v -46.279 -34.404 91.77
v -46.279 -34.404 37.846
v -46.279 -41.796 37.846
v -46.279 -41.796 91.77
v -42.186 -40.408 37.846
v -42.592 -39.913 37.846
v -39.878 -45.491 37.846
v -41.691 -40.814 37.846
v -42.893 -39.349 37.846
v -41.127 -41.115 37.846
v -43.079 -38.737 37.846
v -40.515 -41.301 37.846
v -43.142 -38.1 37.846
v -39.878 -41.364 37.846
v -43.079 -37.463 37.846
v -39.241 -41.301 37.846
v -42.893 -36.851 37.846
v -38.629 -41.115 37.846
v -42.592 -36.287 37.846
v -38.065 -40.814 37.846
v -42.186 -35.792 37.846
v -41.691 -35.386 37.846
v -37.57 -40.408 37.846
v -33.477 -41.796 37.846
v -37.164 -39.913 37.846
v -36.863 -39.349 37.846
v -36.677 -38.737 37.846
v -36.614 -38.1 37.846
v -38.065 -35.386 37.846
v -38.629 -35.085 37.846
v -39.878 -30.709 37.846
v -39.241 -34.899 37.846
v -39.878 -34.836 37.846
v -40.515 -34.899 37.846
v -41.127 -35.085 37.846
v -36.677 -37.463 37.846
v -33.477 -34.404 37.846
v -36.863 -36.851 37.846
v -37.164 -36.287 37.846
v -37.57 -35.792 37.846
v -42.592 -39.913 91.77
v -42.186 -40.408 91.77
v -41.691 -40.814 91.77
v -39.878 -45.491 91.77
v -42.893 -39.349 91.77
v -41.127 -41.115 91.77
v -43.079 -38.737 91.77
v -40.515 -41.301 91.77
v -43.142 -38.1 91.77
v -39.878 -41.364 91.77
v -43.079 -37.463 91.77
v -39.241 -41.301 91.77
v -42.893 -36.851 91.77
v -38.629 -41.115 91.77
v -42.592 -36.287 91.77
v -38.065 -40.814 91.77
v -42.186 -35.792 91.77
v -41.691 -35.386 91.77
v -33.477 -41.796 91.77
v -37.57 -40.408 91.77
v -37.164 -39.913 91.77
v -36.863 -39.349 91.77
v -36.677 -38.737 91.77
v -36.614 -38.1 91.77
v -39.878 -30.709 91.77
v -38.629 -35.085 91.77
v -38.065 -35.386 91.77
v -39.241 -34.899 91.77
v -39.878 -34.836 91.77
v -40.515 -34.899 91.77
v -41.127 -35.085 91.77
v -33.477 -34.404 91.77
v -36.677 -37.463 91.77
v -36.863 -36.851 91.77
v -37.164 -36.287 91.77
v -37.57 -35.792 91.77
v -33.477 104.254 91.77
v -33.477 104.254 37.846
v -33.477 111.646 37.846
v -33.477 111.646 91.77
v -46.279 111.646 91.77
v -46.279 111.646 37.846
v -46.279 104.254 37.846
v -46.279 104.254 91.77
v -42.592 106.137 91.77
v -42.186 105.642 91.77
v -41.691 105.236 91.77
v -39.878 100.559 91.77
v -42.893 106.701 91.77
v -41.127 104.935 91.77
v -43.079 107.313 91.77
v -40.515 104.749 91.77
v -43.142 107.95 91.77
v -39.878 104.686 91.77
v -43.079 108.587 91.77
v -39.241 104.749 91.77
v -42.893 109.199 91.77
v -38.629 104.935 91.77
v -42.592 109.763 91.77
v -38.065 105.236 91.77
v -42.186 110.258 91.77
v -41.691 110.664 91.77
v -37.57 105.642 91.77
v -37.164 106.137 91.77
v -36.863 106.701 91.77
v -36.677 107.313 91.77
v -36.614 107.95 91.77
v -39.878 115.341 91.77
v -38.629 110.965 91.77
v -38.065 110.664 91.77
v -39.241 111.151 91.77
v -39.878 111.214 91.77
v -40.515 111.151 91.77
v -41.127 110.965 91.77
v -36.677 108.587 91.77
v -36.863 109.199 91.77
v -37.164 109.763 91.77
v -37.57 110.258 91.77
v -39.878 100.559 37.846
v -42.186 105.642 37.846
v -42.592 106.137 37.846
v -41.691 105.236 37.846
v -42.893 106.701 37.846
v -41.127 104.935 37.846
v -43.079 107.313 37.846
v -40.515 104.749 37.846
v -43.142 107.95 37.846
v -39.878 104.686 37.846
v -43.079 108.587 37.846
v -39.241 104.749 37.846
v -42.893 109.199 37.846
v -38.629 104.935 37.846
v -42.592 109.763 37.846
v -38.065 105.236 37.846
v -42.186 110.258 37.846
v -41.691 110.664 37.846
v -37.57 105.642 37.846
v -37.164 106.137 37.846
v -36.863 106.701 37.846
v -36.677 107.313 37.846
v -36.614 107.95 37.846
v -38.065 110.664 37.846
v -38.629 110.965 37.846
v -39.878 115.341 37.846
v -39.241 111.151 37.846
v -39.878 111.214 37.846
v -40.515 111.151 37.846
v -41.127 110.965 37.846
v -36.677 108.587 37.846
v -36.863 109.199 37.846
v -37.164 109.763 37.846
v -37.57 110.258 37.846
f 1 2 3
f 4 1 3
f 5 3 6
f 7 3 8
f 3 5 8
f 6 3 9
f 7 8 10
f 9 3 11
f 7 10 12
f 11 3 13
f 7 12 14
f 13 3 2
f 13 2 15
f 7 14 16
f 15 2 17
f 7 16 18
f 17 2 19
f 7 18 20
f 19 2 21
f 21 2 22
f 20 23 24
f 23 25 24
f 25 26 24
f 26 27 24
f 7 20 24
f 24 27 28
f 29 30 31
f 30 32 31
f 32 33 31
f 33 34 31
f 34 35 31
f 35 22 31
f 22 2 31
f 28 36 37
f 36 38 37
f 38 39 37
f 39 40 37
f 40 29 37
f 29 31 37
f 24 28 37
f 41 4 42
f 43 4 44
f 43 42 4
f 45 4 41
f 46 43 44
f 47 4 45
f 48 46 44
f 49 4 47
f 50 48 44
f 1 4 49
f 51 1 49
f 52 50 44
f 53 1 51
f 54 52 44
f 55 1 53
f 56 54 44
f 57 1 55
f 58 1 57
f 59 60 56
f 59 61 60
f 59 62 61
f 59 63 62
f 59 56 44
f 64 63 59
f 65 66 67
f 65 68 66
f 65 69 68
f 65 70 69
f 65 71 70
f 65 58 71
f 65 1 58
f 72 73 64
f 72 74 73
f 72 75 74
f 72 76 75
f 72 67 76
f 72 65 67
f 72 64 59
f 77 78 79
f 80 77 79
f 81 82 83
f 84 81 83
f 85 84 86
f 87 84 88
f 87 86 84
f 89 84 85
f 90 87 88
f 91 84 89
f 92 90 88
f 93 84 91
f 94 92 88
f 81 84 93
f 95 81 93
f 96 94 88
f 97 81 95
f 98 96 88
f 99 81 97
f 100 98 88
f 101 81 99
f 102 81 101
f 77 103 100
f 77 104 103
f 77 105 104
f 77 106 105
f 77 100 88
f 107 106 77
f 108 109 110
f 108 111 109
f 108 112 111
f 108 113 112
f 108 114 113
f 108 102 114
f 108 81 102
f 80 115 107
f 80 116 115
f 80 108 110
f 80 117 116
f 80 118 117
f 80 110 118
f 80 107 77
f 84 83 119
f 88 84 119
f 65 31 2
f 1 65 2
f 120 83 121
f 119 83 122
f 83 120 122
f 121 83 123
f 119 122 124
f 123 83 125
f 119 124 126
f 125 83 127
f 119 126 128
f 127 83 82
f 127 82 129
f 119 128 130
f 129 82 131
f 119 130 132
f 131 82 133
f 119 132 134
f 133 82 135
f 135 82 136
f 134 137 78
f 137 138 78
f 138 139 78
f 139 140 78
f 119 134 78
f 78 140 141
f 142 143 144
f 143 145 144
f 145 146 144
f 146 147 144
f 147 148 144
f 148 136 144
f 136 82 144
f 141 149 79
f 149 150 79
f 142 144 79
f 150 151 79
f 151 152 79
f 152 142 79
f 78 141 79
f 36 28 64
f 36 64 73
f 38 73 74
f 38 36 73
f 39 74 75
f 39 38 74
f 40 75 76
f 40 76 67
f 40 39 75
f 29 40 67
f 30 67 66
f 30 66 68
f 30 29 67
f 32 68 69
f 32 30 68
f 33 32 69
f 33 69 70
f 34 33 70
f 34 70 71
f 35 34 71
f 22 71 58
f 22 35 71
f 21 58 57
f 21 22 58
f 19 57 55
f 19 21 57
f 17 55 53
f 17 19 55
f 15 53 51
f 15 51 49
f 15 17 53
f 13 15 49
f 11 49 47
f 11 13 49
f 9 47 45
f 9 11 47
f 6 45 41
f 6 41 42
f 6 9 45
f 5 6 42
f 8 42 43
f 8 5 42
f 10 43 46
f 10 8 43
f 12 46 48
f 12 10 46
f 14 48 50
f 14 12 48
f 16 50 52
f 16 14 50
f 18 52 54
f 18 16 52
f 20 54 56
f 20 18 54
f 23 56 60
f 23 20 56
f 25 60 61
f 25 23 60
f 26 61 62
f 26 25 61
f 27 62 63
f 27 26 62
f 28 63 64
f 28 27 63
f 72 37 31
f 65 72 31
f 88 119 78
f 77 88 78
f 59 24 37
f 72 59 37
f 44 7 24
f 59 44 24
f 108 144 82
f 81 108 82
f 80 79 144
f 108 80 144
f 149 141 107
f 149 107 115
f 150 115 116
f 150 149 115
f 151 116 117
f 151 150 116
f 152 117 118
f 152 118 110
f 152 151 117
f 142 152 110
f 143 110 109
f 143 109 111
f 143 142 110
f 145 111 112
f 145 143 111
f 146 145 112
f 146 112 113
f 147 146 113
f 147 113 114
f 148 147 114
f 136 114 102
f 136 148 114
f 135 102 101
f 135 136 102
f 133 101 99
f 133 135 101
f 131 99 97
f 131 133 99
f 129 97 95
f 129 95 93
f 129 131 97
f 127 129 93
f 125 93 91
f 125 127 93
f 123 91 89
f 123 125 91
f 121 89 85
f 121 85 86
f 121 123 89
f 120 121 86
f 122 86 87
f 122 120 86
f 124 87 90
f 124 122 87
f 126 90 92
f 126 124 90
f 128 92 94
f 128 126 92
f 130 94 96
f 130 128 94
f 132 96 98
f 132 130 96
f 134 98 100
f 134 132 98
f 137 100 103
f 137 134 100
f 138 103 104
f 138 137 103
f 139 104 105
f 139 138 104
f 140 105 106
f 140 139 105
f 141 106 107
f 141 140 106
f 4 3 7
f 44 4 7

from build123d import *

# Parameters (mm, degrees)
SKETCH1_R             = 3.2639
BOSS_EXTRUDE1_DEPTH   = 53.9242
BOSS_EXTRUDE1_2_DEPTH = 53.9242


with BuildPart() as part:
    # Sketch1 → Boss-Extrude1 (new body)
    with BuildSketch(Plane.XY.offset(37.846)):
        Polygon((-33.4772, 104.254496397), (-33.4772, 111.645503603), (-39.878, 115.341007206), (-46.2788, 111.645503603), (-46.2788, 104.254496397), (-39.878, 100.558992794), align=None)
        with Locations((-39.878, 107.95)):
            Circle(SKETCH1_R, mode=Mode.SUBTRACT)
    extrude(amount=BOSS_EXTRUDE1_DEPTH)


with BuildPart() as body_2:
    # Sketch1 → Boss-Extrude1 2 (new body)
    with BuildSketch(Plane.XY.offset(37.846)):
        Polygon((-33.4772, -34.404496397), (-39.878, -30.708992794), (-46.2788, -34.404496397), (-46.2788, -41.795503603), (-39.878, -45.491007206), (-33.4772, -41.795503603), align=None)
        with Locations((-39.878, -38.1)):
            Circle(SKETCH1_R, mode=Mode.SUBTRACT)
    extrude(amount=BOSS_EXTRUDE1_2_DEPTH)


solid = Compound([part.part, body_2.part])
